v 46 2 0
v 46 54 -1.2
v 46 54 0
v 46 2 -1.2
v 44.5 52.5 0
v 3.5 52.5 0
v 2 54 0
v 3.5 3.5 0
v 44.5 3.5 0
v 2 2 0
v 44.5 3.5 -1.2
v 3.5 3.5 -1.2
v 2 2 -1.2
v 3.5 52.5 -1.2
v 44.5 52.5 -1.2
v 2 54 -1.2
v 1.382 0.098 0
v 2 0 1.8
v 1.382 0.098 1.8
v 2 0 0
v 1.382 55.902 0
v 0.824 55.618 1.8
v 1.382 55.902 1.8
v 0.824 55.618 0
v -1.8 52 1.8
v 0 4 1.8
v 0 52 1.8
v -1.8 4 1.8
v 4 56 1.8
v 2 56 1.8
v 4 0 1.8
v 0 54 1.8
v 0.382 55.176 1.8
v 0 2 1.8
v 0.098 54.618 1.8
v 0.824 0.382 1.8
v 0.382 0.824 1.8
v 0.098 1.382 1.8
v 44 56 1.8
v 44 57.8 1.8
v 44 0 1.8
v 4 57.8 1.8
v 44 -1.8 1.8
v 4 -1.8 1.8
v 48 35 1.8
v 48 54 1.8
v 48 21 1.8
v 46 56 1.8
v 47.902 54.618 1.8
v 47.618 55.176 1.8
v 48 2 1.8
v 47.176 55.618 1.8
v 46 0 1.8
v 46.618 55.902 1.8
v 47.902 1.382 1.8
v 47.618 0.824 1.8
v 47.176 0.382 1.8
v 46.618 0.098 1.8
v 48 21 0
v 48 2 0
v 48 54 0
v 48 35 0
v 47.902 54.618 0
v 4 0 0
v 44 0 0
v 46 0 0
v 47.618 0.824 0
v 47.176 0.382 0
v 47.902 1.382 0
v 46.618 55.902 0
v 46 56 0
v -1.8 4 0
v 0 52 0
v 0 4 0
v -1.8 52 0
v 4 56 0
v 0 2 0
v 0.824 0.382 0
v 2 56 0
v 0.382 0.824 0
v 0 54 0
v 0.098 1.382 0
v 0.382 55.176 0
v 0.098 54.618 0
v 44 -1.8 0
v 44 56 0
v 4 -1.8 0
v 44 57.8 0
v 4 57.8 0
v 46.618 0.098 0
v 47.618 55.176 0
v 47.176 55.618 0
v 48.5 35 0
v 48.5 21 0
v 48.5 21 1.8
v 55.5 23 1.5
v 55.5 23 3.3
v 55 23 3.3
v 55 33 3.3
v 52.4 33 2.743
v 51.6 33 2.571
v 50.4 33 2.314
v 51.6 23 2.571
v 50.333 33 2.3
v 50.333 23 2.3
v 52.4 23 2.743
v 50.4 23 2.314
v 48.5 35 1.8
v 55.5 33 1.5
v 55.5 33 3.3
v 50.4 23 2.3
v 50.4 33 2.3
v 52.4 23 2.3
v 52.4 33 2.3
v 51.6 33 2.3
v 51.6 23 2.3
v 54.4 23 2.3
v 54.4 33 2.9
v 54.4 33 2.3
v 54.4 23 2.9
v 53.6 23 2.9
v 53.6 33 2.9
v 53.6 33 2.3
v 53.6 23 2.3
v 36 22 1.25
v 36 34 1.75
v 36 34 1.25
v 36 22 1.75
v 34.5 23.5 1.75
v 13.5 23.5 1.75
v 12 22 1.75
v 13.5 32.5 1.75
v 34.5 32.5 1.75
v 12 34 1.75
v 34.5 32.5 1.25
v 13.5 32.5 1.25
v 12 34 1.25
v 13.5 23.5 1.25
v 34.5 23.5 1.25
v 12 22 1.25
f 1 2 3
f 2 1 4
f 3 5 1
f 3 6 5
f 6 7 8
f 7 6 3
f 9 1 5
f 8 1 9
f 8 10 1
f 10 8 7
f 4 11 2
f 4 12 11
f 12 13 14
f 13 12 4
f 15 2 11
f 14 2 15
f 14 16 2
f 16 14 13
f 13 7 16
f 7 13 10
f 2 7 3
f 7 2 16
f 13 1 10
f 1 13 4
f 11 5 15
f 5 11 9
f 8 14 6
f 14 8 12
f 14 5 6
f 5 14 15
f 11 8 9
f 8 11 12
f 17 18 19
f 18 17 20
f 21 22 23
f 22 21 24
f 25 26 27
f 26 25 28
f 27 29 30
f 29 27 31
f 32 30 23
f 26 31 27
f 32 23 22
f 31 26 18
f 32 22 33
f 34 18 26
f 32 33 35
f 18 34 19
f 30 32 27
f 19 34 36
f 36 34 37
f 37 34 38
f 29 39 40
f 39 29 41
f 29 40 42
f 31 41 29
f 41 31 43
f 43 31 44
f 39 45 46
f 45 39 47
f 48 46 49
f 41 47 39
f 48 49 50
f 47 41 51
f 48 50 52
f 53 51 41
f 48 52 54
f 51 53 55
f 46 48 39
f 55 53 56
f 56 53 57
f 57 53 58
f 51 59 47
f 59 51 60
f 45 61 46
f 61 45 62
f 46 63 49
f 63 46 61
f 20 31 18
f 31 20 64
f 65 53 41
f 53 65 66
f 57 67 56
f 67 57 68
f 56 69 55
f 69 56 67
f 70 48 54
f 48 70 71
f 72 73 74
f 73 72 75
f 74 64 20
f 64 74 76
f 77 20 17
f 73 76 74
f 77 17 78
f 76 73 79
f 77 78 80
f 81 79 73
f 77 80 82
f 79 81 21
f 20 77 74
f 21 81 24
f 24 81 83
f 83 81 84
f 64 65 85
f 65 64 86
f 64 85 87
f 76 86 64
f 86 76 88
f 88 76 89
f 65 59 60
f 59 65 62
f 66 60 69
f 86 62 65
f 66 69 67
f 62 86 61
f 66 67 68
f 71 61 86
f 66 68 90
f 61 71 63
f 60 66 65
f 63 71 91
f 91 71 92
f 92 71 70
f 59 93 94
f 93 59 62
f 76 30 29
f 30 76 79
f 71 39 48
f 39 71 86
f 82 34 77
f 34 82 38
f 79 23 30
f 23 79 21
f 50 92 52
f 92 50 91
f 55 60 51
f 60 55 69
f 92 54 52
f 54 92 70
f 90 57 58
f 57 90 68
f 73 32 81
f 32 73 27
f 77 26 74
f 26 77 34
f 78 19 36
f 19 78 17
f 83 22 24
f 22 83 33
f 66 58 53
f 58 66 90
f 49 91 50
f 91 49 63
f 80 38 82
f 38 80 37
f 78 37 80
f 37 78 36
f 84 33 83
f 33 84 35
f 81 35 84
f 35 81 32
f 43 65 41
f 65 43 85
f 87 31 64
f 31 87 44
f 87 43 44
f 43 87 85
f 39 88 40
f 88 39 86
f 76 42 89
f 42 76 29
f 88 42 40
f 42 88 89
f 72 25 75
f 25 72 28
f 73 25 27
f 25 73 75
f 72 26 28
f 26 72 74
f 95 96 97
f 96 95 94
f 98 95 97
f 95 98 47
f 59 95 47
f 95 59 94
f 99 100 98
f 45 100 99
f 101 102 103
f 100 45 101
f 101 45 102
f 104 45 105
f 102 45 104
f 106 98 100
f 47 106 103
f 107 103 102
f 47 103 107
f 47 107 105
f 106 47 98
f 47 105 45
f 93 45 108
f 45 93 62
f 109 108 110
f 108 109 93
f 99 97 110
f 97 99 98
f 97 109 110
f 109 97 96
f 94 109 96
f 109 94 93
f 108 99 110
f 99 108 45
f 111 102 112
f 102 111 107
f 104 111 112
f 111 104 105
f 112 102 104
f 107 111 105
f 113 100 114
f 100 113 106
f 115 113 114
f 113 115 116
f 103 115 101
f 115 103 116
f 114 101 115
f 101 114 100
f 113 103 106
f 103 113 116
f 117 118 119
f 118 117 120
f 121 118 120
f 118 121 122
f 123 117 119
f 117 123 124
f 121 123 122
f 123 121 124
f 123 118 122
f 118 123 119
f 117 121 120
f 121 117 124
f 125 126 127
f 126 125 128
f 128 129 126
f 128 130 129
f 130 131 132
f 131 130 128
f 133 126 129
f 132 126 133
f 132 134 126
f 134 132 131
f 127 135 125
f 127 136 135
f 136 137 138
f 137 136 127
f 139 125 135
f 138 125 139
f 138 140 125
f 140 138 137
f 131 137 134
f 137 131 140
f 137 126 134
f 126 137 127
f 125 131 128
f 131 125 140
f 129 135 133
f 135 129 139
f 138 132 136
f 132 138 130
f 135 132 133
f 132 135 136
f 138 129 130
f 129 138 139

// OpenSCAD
// file: ../../00_common/parameters.scad
// =============================================================================
// OpenMotorBridge - Global CAD Parameters & Settings
// =============================================================================
// File: hardware/cad/scad/00_common/parameters.scad
// Description: Global dimensional constants, manufacturing clearances and
//              circle resolution ($fn) for all OpenSCAD modules.
// =============================================================================

// --- 1. Circle & Curve Resolution ---
$fn = 60; // Smooth cylinders and holes for high-quality MJF 3D printing

// --- 2. Central Main Box Dimensions (3-Tier Sandwich) ---
MAIN_BOX_OUTER_L      = 110.0; // Outer length in X (mm)
MAIN_BOX_OUTER_W      = 74.0;  // Outer width in Y (mm)
MAIN_BOX_LOWER_H      = 17.0;  // Lower case height in Z (mm)
MAIN_BOX_MID_H        = 15.0;  // Mid tray height in Z (mm)
MAIN_BOX_LID_H        = 4.0;   // Lid plate thickness in Z (mm)
MAIN_BOX_WALL         = 2.5;   // Nominal wall thickness (mm)
MAIN_BOX_CORNER_POST  = 7.0;   // Corner clamping screw post size (mm, for M3 hex nut pockets)

// --- 3. Satellite Pod Dimensions (Universal Enlarged Envelope) ---
POD_OUTER_L           = 150.0; // Outer length in X (mm, standardized for serial PCBA 03 + Cardo/Sena/OMM)
POD_OUTER_W           = 70.0;  // Outer width in Y (mm)
POD_OUTER_H           = 38.0;  // Outer height in Z (mm)
POD_WALL              = 3.5;   // Nominal wall thickness (mm)
POD_BULKHEAD_X        = 18.0;  // Partition bulkhead position in X (mm)
POD_CHAMBER_L         = 132.0; // Sliding chamber length in X (mm, clears 130mm sled + 2mm margin)
POD_CHAMBER_W         = 63.0;  // Sliding chamber width in Y (mm)
POD_CHAMBER_H         = 31.0;  // Sliding chamber height in Z (mm)

// --- 4. Pod Linear Guide Rails (Poka-Yoke Tongue & Groove) ---
POD_GROOVE_W          = 3.0;   // Internal guide groove width in Z (mm)
POD_GROOVE_DEPTH      = 1.5;   // Internal guide groove depth in Y (mm)
POD_GROOVE_LEFT_Z     = 10.0;  // Center height of left groove (mm)
POD_GROOVE_RIGHT_Z    = 18.0;  // Center height of right groove (mm, asym offset)

CARTRIDGE_TONGUE_W    = 2.6;   // Cartridge tongue rail height in Z (mm, 0.2mm clearance)
CARTRIDGE_TONGUE_PROT = 1.4;   // Cartridge tongue protrusion in Y (mm, 0.1mm clearance)
CARTRIDGE_CHAMFER_L   = 4.0;   // 30° lead-in chamfer nose length (mm)

// --- 5. Cartridge Dimensions (Enlarged Universal Sled) ---
CARTRIDGE_BASE_L      = 130.0; // Sled length in X (mm, accommodates PCBA 03 + OEM Cardo Air-Mount/Sena/OMM serial layout)
CARTRIDGE_BASE_W      = 58.0;  // Sled width in Y (mm)
CARTRIDGE_BASE_H      = 28.0;  // Sled height in Z (mm)
CARTRIDGE_FACE_L      = 4.0;   // Front faceplate thickness in X (mm)
CARTRIDGE_FACE_W      = 64.0;  // Front faceplate width in Y (mm)
CARTRIDGE_FACE_H      = 34.0;  // Front faceplate height in Z (mm)

// --- 5a. RF Interface & Sealing Dimensions ---
SMA_BORE_R            = 3.25;  // Ø 6.5 mm through-hole for standard SMA bulkhead
SMA_ORECESS_R         = 4.75;  // Ø 9.5 mm recess for waterproof silicone O-ring
SMA_ORECESS_DEPTH     = 1.2;   // 1.2 mm deep O-ring compression pocket

// --- 5b. Magnetic Anti-Theft Lock System ---
LATCH_PIVOT_X         = 65.0;  // Center pivot position along sled X (mm, centered on 130mm sled)
LATCH_MAGNET_X        = 53.0;  // Ferromagnetic anchor position along sled X (mm)
LATCH_TOOTH_X         = 77.0;  // Locking sawtooth pawl position along sled X (mm)
LATCH_ARM_H           = 6.0;   // Rocker lever height in Z (mm)
LATCH_ARM_THICK       = 2.6;   // Rocker beam thickness in Y (mm)
LATCH_MAGNET_PIN_DIA  = 6.2;   // Bore for Ø 6.0 mm steel dowel pin (mm)
LATCH_SPRING_DIA      = 3.8;   // Bore for Ø 3.5 mm return compression spring (mm)

// --- 6. Standard Captive Hex Nut Pockets (DIN 934 / DIN 985 with +0.2 mm MJF/FDM clearance) ---
NUT_M2_SW             = 4.2;   // M2 across flats (nominal 4.0 mm)
NUT_M2_H              = 1.8;   // M2 thickness (nominal 1.6 mm)
NUT_M2_5_SW           = 5.2;   // M2.5 across flats (nominal 5.0 mm)
NUT_M2_5_H            = 2.2;   // M2.5 thickness (nominal 2.0 mm)
NUT_M3_SW             = 5.7;   // M3 across flats (nominal 5.5 mm)
NUT_M3_H              = 2.6;   // M3 thickness (nominal 2.4 mm)
NUT_M4_SW             = 7.2;   // M4 across flats (nominal 7.0 mm)
NUT_M4_H              = 3.4;   // M4 thickness (nominal 3.2 mm)
NUT_M5_SW             = 8.2;   // M5 across flats (nominal 8.0 mm)
NUT_M5_H              = 4.2;   // M5 thickness (nominal 4.0 mm)

// Direct Plastic Thread-Forming / Self-Tapping Pilot Holes in PA12 (100% Soldering-Iron Free)
M2_PILOT_HOLE_R       = 0.85;  // Core hole for M2 screws in PA12 (Ø 1.7 mm)
M2_5_PILOT_HOLE_R     = 1.05;  // Core hole for M2.5 screws in PA12 (Ø 2.1 mm)
M3_PILOT_HOLE_R       = 1.25;  // Core hole for M3 screws in PA12 (Ø 2.5 mm)

// --- 7. Screw & Clearance Dimensions ---
M2_SCREW_HOLE_R       = 1.1;   // M2 clearance hole (r = 1.1 mm -> Ø 2.2 mm)
M2_5_SCREW_HOLE_R     = 1.4;   // M2.5 clearance hole (r = 1.4 mm -> Ø 2.8 mm)
M3_SCREW_HOLE_R       = 1.65;  // M3 clearance hole (r = 1.65 mm -> Ø 3.3 mm)
M4_SCREW_HOLE_R       = 2.2;   // M4 clearance hole (r = 2.2 mm -> Ø 4.4 mm)
M8_BORE_R             = 4.0;   // M8 cable through-bore (r = 4.0 mm -> Ø 8.0 mm)
M8_STUDS_OUTER_R      = 6.0;   // M8 neck outer radius (Ø 12.0 mm)

// --- 8. Universal Front Node Enclosure Dimensions (Type E: 98 x 68 x 25 mm) ---
FRONT_NODE_PCB_L      = 82.0;  // PCB length in X (mm, PCBA 05)
FRONT_NODE_PCB_W      = 50.0;  // PCB width in Y (mm, PCBA 05)
FRONT_NODE_PCB_H      = 1.6;   // PCB thickness in Z (mm)
FRONT_NODE_PCB_R      = 2.5;   // PCB corner radius (mm)

FRONT_NODE_CHAMBER_L  = 86.0;  // Internal chamber length in X (mm, 2mm margin per side)
FRONT_NODE_CHAMBER_W  = 56.0;  // Internal chamber width in Y (mm, 3mm margin per side)
FRONT_NODE_TUB_H      = 17.5;  // Lower tub depth in Z (mm)
FRONT_NODE_LID_H      = 7.5;   // Upper lid height in Z (mm)
FRONT_NODE_WALL       = 2.5;   // Wall thickness in HP MJF PA12 (mm)
FRONT_NODE_CORNER_R   = 4.0;   // Outer enclosure corner radius (mm)

FRONT_NODE_OUTER_L    = FRONT_NODE_CHAMBER_L + 2 * FRONT_NODE_WALL + 7.0; // 98.0 mm
FRONT_NODE_OUTER_W    = FRONT_NODE_CHAMBER_W + 2 * FRONT_NODE_WALL + 7.0; // 68.0 mm
FRONT_NODE_OUTER_H    = FRONT_NODE_TUB_H + FRONT_NODE_LID_H;              // 25.0 mm

// PCB Standoff Heights & Radii (100% Soldering-Iron Free)
FRONT_NODE_STANDOFF_H = 3.0;   // Height of PCB standoffs from floor (mm)
FRONT_NODE_STANDOFF_R = 3.0;   // Outer radius of M2.5 screw bosses (mm)
FRONT_NODE_CORE_HOLE_R= M2_5_PILOT_HOLE_R; // Core hole for direct M2.5 screw engagement (Ø 2.1 mm)

// AMPS 4-Hole Mounting Pattern (38 x 30 mm with DIN 934 M4 Captive Nut Pockets)
AMPS_SPACING_X        = 38.0;  // AMPS hole distance in X (mm)
AMPS_SPACING_Y        = 30.0;  // AMPS hole distance in Y (mm)
AMPS_NUT_SW           = NUT_M4_SW; // Captive M4 hex nut pocket across flats (7.2 mm)
AMPS_NUT_H            = NUT_M4_H;  // Captive M4 hex nut pocket depth (3.4 mm)

// Acoustic Vent for Knowles SPH0645 MEMS
FRONT_NODE_MIC_HOLE_R = 1.25;  // Sound canal radius (Ø 2.5 mm)
FRONT_NODE_MIC_MEMB_R = 3.0;   // Gore ePTFE membrane pocket radius (Ø 6.0 mm)
FRONT_NODE_MIC_MEMB_D = 0.8;   // Membrane pocket depth (mm)
// main file
// =============================================================================
// OpenMotorBridge - Satellite Pod: Intermediate Splash Shield (Dry-Flap)
// =============================================================================
// File: hardware/cad/scad/02_pod_base/parts/014_pod_dry_flap.scad
// Description: Flexible TPU/EPDM intermediate splash-guard cover (Zwischendeckel /
//              Dry-Flap) isolating the lower PCBA 03 electronics zone from the
//              upper equipment chamber and luggage environment.
// Features:
// 1. Fits form-flush over the lower PCBA 03 chamber (48.0 x 56.0 mm).
// 2. Integral perimeter sealing lip (Shore 50A / TPU 85A).
// 3. Flexible living hinge or snap-flange on bulkhead side.
// 4. Ergonomic pull tab at rear edge for tool-free opening during inspection.
// 5. Embossed "DRY-FLAP / PCBA 03" tactile labeling and lightning flash icon.
// =============================================================================

include <../../00_common/parameters.scad>;

FLAP_L = 48.0;  // Covers PCBA 03 length (mm)
FLAP_W = 56.0;  // Fits internal width between shelf rails (mm)
FLAP_H = 1.8;   // Flexible membrane thickness (mm)

module pod_dry_flap() {
    difference() {
        union() {
            // 1. Main Flexible Shield Membrane with Rounded Corners
            hull() {
                translate([2.0, 2.0, 0])
                    cylinder(r=2.0, h=FLAP_H, $fn=20);
                translate([FLAP_L - 2.0, 2.0, 0])
                    cylinder(r=2.0, h=FLAP_H, $fn=20);
                translate([2.0, FLAP_W - 2.0, 0])
                    cylinder(r=2.0, h=FLAP_H, $fn=20);
                translate([FLAP_L - 2.0, FLAP_W - 2.0, 0])
                    cylinder(r=2.0, h=FLAP_H, $fn=20);
            }

            // 2. Lateral Retention Flanges (slide or snap into internal housing grooves)
            translate([4.0, -1.8, 0])
                cube([FLAP_L - 8.0, 1.8, FLAP_H], center=false);
            translate([4.0, FLAP_W, 0])
                cube([FLAP_L - 8.0, 1.8, FLAP_H], center=false);

            // 3. Front Bulkhead Hinge Bead / Tongue
            translate([-1.8, 4.0, 0])
                cube([1.8, FLAP_W - 8.0, FLAP_H], center=false);

            // 4. Ergonomic Rear Pull Tab (Finger lift tab)
            translate([FLAP_L, FLAP_W/2.0 - 7.0, 0]) {
                hull() {
                    cube([0.5, 14.0, FLAP_H], center=false);
                    translate([7.0, 2.0, 1.5])
                        cube([0.5, 10.0, FLAP_H], center=false);
                }
            }

            // Underside Perimeter Sealing Lip
            translate([2.0, 2.0, -1.2]) {
                difference() {
                    cube([FLAP_L - 4.0, FLAP_W - 4.0, 1.2], center=false);
                    translate([1.5, 1.5, -0.1])
                        cube([FLAP_L - 7.0, FLAP_W - 7.0, 1.4], center=false);
                }
            }
        }

        // Tactile grip grooves on pull tab
        for (tx = [FLAP_L + 2.0 : 2.0 : FLAP_L + 6.0]) {
            translate([tx, FLAP_W/2.0, FLAP_H + 0.8])
                cube([0.8, 10.0, 0.6], center=true);
        }

        // Embossed warning / service mark
        translate([FLAP_L/2.0, FLAP_W/2.0, FLAP_H - 0.3]) {
            // Molded seal outline
            difference() {
                cube([24.0, 12.0, 0.5], center=true);
                cube([21.0, 9.0, 0.6], center=true);
            }
        }
    }
}

// Standalone preview (Translucent Amber / Yellow Shore 50A TPU)
color([0.9, 0.65, 0.15, 0.85])
    pod_dry_flap();
